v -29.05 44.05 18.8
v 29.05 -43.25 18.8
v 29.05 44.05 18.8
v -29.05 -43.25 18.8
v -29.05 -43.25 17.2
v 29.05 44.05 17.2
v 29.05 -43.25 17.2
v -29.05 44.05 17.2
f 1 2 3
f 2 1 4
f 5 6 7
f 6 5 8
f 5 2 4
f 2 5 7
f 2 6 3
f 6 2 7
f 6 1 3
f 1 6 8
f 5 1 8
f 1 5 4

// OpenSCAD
$fn=50;

w_batt = 57;
h_batt = 85;
t_batt = 19;

t_wall = 1.6;

module box() {
	difference() {
		cube(size=[w_batt + 2 * t_wall, h_batt + 2 * t_wall, t_batt + 2 * t_wall], center=true);
		translate([0, 0, 2.5])
			cube(size=[w_batt, h_batt, t_batt + 5], center=true);
		translate([0, 5, (t_batt + t_wall + 0.01) / 2])
			cube(size=[w_batt + t_wall, h_batt + t_wall + 10, t_wall], center=true);
		translate([-w_batt / 2 + 6, -h_batt / 2, 0])
			cube([11, 10, t_batt], center=true);
	}
}

// box();

translate([0, t_wall / 4, 18])
	cube(size=[w_batt + t_wall - 0.5, h_batt + 1.5 * t_wall - 0.1, t_wall], center=true);

// intersection() {
// 	box();
// 	translate([50, 0, 0])
// 		cube([100, 100, 100], center=true);
// }
